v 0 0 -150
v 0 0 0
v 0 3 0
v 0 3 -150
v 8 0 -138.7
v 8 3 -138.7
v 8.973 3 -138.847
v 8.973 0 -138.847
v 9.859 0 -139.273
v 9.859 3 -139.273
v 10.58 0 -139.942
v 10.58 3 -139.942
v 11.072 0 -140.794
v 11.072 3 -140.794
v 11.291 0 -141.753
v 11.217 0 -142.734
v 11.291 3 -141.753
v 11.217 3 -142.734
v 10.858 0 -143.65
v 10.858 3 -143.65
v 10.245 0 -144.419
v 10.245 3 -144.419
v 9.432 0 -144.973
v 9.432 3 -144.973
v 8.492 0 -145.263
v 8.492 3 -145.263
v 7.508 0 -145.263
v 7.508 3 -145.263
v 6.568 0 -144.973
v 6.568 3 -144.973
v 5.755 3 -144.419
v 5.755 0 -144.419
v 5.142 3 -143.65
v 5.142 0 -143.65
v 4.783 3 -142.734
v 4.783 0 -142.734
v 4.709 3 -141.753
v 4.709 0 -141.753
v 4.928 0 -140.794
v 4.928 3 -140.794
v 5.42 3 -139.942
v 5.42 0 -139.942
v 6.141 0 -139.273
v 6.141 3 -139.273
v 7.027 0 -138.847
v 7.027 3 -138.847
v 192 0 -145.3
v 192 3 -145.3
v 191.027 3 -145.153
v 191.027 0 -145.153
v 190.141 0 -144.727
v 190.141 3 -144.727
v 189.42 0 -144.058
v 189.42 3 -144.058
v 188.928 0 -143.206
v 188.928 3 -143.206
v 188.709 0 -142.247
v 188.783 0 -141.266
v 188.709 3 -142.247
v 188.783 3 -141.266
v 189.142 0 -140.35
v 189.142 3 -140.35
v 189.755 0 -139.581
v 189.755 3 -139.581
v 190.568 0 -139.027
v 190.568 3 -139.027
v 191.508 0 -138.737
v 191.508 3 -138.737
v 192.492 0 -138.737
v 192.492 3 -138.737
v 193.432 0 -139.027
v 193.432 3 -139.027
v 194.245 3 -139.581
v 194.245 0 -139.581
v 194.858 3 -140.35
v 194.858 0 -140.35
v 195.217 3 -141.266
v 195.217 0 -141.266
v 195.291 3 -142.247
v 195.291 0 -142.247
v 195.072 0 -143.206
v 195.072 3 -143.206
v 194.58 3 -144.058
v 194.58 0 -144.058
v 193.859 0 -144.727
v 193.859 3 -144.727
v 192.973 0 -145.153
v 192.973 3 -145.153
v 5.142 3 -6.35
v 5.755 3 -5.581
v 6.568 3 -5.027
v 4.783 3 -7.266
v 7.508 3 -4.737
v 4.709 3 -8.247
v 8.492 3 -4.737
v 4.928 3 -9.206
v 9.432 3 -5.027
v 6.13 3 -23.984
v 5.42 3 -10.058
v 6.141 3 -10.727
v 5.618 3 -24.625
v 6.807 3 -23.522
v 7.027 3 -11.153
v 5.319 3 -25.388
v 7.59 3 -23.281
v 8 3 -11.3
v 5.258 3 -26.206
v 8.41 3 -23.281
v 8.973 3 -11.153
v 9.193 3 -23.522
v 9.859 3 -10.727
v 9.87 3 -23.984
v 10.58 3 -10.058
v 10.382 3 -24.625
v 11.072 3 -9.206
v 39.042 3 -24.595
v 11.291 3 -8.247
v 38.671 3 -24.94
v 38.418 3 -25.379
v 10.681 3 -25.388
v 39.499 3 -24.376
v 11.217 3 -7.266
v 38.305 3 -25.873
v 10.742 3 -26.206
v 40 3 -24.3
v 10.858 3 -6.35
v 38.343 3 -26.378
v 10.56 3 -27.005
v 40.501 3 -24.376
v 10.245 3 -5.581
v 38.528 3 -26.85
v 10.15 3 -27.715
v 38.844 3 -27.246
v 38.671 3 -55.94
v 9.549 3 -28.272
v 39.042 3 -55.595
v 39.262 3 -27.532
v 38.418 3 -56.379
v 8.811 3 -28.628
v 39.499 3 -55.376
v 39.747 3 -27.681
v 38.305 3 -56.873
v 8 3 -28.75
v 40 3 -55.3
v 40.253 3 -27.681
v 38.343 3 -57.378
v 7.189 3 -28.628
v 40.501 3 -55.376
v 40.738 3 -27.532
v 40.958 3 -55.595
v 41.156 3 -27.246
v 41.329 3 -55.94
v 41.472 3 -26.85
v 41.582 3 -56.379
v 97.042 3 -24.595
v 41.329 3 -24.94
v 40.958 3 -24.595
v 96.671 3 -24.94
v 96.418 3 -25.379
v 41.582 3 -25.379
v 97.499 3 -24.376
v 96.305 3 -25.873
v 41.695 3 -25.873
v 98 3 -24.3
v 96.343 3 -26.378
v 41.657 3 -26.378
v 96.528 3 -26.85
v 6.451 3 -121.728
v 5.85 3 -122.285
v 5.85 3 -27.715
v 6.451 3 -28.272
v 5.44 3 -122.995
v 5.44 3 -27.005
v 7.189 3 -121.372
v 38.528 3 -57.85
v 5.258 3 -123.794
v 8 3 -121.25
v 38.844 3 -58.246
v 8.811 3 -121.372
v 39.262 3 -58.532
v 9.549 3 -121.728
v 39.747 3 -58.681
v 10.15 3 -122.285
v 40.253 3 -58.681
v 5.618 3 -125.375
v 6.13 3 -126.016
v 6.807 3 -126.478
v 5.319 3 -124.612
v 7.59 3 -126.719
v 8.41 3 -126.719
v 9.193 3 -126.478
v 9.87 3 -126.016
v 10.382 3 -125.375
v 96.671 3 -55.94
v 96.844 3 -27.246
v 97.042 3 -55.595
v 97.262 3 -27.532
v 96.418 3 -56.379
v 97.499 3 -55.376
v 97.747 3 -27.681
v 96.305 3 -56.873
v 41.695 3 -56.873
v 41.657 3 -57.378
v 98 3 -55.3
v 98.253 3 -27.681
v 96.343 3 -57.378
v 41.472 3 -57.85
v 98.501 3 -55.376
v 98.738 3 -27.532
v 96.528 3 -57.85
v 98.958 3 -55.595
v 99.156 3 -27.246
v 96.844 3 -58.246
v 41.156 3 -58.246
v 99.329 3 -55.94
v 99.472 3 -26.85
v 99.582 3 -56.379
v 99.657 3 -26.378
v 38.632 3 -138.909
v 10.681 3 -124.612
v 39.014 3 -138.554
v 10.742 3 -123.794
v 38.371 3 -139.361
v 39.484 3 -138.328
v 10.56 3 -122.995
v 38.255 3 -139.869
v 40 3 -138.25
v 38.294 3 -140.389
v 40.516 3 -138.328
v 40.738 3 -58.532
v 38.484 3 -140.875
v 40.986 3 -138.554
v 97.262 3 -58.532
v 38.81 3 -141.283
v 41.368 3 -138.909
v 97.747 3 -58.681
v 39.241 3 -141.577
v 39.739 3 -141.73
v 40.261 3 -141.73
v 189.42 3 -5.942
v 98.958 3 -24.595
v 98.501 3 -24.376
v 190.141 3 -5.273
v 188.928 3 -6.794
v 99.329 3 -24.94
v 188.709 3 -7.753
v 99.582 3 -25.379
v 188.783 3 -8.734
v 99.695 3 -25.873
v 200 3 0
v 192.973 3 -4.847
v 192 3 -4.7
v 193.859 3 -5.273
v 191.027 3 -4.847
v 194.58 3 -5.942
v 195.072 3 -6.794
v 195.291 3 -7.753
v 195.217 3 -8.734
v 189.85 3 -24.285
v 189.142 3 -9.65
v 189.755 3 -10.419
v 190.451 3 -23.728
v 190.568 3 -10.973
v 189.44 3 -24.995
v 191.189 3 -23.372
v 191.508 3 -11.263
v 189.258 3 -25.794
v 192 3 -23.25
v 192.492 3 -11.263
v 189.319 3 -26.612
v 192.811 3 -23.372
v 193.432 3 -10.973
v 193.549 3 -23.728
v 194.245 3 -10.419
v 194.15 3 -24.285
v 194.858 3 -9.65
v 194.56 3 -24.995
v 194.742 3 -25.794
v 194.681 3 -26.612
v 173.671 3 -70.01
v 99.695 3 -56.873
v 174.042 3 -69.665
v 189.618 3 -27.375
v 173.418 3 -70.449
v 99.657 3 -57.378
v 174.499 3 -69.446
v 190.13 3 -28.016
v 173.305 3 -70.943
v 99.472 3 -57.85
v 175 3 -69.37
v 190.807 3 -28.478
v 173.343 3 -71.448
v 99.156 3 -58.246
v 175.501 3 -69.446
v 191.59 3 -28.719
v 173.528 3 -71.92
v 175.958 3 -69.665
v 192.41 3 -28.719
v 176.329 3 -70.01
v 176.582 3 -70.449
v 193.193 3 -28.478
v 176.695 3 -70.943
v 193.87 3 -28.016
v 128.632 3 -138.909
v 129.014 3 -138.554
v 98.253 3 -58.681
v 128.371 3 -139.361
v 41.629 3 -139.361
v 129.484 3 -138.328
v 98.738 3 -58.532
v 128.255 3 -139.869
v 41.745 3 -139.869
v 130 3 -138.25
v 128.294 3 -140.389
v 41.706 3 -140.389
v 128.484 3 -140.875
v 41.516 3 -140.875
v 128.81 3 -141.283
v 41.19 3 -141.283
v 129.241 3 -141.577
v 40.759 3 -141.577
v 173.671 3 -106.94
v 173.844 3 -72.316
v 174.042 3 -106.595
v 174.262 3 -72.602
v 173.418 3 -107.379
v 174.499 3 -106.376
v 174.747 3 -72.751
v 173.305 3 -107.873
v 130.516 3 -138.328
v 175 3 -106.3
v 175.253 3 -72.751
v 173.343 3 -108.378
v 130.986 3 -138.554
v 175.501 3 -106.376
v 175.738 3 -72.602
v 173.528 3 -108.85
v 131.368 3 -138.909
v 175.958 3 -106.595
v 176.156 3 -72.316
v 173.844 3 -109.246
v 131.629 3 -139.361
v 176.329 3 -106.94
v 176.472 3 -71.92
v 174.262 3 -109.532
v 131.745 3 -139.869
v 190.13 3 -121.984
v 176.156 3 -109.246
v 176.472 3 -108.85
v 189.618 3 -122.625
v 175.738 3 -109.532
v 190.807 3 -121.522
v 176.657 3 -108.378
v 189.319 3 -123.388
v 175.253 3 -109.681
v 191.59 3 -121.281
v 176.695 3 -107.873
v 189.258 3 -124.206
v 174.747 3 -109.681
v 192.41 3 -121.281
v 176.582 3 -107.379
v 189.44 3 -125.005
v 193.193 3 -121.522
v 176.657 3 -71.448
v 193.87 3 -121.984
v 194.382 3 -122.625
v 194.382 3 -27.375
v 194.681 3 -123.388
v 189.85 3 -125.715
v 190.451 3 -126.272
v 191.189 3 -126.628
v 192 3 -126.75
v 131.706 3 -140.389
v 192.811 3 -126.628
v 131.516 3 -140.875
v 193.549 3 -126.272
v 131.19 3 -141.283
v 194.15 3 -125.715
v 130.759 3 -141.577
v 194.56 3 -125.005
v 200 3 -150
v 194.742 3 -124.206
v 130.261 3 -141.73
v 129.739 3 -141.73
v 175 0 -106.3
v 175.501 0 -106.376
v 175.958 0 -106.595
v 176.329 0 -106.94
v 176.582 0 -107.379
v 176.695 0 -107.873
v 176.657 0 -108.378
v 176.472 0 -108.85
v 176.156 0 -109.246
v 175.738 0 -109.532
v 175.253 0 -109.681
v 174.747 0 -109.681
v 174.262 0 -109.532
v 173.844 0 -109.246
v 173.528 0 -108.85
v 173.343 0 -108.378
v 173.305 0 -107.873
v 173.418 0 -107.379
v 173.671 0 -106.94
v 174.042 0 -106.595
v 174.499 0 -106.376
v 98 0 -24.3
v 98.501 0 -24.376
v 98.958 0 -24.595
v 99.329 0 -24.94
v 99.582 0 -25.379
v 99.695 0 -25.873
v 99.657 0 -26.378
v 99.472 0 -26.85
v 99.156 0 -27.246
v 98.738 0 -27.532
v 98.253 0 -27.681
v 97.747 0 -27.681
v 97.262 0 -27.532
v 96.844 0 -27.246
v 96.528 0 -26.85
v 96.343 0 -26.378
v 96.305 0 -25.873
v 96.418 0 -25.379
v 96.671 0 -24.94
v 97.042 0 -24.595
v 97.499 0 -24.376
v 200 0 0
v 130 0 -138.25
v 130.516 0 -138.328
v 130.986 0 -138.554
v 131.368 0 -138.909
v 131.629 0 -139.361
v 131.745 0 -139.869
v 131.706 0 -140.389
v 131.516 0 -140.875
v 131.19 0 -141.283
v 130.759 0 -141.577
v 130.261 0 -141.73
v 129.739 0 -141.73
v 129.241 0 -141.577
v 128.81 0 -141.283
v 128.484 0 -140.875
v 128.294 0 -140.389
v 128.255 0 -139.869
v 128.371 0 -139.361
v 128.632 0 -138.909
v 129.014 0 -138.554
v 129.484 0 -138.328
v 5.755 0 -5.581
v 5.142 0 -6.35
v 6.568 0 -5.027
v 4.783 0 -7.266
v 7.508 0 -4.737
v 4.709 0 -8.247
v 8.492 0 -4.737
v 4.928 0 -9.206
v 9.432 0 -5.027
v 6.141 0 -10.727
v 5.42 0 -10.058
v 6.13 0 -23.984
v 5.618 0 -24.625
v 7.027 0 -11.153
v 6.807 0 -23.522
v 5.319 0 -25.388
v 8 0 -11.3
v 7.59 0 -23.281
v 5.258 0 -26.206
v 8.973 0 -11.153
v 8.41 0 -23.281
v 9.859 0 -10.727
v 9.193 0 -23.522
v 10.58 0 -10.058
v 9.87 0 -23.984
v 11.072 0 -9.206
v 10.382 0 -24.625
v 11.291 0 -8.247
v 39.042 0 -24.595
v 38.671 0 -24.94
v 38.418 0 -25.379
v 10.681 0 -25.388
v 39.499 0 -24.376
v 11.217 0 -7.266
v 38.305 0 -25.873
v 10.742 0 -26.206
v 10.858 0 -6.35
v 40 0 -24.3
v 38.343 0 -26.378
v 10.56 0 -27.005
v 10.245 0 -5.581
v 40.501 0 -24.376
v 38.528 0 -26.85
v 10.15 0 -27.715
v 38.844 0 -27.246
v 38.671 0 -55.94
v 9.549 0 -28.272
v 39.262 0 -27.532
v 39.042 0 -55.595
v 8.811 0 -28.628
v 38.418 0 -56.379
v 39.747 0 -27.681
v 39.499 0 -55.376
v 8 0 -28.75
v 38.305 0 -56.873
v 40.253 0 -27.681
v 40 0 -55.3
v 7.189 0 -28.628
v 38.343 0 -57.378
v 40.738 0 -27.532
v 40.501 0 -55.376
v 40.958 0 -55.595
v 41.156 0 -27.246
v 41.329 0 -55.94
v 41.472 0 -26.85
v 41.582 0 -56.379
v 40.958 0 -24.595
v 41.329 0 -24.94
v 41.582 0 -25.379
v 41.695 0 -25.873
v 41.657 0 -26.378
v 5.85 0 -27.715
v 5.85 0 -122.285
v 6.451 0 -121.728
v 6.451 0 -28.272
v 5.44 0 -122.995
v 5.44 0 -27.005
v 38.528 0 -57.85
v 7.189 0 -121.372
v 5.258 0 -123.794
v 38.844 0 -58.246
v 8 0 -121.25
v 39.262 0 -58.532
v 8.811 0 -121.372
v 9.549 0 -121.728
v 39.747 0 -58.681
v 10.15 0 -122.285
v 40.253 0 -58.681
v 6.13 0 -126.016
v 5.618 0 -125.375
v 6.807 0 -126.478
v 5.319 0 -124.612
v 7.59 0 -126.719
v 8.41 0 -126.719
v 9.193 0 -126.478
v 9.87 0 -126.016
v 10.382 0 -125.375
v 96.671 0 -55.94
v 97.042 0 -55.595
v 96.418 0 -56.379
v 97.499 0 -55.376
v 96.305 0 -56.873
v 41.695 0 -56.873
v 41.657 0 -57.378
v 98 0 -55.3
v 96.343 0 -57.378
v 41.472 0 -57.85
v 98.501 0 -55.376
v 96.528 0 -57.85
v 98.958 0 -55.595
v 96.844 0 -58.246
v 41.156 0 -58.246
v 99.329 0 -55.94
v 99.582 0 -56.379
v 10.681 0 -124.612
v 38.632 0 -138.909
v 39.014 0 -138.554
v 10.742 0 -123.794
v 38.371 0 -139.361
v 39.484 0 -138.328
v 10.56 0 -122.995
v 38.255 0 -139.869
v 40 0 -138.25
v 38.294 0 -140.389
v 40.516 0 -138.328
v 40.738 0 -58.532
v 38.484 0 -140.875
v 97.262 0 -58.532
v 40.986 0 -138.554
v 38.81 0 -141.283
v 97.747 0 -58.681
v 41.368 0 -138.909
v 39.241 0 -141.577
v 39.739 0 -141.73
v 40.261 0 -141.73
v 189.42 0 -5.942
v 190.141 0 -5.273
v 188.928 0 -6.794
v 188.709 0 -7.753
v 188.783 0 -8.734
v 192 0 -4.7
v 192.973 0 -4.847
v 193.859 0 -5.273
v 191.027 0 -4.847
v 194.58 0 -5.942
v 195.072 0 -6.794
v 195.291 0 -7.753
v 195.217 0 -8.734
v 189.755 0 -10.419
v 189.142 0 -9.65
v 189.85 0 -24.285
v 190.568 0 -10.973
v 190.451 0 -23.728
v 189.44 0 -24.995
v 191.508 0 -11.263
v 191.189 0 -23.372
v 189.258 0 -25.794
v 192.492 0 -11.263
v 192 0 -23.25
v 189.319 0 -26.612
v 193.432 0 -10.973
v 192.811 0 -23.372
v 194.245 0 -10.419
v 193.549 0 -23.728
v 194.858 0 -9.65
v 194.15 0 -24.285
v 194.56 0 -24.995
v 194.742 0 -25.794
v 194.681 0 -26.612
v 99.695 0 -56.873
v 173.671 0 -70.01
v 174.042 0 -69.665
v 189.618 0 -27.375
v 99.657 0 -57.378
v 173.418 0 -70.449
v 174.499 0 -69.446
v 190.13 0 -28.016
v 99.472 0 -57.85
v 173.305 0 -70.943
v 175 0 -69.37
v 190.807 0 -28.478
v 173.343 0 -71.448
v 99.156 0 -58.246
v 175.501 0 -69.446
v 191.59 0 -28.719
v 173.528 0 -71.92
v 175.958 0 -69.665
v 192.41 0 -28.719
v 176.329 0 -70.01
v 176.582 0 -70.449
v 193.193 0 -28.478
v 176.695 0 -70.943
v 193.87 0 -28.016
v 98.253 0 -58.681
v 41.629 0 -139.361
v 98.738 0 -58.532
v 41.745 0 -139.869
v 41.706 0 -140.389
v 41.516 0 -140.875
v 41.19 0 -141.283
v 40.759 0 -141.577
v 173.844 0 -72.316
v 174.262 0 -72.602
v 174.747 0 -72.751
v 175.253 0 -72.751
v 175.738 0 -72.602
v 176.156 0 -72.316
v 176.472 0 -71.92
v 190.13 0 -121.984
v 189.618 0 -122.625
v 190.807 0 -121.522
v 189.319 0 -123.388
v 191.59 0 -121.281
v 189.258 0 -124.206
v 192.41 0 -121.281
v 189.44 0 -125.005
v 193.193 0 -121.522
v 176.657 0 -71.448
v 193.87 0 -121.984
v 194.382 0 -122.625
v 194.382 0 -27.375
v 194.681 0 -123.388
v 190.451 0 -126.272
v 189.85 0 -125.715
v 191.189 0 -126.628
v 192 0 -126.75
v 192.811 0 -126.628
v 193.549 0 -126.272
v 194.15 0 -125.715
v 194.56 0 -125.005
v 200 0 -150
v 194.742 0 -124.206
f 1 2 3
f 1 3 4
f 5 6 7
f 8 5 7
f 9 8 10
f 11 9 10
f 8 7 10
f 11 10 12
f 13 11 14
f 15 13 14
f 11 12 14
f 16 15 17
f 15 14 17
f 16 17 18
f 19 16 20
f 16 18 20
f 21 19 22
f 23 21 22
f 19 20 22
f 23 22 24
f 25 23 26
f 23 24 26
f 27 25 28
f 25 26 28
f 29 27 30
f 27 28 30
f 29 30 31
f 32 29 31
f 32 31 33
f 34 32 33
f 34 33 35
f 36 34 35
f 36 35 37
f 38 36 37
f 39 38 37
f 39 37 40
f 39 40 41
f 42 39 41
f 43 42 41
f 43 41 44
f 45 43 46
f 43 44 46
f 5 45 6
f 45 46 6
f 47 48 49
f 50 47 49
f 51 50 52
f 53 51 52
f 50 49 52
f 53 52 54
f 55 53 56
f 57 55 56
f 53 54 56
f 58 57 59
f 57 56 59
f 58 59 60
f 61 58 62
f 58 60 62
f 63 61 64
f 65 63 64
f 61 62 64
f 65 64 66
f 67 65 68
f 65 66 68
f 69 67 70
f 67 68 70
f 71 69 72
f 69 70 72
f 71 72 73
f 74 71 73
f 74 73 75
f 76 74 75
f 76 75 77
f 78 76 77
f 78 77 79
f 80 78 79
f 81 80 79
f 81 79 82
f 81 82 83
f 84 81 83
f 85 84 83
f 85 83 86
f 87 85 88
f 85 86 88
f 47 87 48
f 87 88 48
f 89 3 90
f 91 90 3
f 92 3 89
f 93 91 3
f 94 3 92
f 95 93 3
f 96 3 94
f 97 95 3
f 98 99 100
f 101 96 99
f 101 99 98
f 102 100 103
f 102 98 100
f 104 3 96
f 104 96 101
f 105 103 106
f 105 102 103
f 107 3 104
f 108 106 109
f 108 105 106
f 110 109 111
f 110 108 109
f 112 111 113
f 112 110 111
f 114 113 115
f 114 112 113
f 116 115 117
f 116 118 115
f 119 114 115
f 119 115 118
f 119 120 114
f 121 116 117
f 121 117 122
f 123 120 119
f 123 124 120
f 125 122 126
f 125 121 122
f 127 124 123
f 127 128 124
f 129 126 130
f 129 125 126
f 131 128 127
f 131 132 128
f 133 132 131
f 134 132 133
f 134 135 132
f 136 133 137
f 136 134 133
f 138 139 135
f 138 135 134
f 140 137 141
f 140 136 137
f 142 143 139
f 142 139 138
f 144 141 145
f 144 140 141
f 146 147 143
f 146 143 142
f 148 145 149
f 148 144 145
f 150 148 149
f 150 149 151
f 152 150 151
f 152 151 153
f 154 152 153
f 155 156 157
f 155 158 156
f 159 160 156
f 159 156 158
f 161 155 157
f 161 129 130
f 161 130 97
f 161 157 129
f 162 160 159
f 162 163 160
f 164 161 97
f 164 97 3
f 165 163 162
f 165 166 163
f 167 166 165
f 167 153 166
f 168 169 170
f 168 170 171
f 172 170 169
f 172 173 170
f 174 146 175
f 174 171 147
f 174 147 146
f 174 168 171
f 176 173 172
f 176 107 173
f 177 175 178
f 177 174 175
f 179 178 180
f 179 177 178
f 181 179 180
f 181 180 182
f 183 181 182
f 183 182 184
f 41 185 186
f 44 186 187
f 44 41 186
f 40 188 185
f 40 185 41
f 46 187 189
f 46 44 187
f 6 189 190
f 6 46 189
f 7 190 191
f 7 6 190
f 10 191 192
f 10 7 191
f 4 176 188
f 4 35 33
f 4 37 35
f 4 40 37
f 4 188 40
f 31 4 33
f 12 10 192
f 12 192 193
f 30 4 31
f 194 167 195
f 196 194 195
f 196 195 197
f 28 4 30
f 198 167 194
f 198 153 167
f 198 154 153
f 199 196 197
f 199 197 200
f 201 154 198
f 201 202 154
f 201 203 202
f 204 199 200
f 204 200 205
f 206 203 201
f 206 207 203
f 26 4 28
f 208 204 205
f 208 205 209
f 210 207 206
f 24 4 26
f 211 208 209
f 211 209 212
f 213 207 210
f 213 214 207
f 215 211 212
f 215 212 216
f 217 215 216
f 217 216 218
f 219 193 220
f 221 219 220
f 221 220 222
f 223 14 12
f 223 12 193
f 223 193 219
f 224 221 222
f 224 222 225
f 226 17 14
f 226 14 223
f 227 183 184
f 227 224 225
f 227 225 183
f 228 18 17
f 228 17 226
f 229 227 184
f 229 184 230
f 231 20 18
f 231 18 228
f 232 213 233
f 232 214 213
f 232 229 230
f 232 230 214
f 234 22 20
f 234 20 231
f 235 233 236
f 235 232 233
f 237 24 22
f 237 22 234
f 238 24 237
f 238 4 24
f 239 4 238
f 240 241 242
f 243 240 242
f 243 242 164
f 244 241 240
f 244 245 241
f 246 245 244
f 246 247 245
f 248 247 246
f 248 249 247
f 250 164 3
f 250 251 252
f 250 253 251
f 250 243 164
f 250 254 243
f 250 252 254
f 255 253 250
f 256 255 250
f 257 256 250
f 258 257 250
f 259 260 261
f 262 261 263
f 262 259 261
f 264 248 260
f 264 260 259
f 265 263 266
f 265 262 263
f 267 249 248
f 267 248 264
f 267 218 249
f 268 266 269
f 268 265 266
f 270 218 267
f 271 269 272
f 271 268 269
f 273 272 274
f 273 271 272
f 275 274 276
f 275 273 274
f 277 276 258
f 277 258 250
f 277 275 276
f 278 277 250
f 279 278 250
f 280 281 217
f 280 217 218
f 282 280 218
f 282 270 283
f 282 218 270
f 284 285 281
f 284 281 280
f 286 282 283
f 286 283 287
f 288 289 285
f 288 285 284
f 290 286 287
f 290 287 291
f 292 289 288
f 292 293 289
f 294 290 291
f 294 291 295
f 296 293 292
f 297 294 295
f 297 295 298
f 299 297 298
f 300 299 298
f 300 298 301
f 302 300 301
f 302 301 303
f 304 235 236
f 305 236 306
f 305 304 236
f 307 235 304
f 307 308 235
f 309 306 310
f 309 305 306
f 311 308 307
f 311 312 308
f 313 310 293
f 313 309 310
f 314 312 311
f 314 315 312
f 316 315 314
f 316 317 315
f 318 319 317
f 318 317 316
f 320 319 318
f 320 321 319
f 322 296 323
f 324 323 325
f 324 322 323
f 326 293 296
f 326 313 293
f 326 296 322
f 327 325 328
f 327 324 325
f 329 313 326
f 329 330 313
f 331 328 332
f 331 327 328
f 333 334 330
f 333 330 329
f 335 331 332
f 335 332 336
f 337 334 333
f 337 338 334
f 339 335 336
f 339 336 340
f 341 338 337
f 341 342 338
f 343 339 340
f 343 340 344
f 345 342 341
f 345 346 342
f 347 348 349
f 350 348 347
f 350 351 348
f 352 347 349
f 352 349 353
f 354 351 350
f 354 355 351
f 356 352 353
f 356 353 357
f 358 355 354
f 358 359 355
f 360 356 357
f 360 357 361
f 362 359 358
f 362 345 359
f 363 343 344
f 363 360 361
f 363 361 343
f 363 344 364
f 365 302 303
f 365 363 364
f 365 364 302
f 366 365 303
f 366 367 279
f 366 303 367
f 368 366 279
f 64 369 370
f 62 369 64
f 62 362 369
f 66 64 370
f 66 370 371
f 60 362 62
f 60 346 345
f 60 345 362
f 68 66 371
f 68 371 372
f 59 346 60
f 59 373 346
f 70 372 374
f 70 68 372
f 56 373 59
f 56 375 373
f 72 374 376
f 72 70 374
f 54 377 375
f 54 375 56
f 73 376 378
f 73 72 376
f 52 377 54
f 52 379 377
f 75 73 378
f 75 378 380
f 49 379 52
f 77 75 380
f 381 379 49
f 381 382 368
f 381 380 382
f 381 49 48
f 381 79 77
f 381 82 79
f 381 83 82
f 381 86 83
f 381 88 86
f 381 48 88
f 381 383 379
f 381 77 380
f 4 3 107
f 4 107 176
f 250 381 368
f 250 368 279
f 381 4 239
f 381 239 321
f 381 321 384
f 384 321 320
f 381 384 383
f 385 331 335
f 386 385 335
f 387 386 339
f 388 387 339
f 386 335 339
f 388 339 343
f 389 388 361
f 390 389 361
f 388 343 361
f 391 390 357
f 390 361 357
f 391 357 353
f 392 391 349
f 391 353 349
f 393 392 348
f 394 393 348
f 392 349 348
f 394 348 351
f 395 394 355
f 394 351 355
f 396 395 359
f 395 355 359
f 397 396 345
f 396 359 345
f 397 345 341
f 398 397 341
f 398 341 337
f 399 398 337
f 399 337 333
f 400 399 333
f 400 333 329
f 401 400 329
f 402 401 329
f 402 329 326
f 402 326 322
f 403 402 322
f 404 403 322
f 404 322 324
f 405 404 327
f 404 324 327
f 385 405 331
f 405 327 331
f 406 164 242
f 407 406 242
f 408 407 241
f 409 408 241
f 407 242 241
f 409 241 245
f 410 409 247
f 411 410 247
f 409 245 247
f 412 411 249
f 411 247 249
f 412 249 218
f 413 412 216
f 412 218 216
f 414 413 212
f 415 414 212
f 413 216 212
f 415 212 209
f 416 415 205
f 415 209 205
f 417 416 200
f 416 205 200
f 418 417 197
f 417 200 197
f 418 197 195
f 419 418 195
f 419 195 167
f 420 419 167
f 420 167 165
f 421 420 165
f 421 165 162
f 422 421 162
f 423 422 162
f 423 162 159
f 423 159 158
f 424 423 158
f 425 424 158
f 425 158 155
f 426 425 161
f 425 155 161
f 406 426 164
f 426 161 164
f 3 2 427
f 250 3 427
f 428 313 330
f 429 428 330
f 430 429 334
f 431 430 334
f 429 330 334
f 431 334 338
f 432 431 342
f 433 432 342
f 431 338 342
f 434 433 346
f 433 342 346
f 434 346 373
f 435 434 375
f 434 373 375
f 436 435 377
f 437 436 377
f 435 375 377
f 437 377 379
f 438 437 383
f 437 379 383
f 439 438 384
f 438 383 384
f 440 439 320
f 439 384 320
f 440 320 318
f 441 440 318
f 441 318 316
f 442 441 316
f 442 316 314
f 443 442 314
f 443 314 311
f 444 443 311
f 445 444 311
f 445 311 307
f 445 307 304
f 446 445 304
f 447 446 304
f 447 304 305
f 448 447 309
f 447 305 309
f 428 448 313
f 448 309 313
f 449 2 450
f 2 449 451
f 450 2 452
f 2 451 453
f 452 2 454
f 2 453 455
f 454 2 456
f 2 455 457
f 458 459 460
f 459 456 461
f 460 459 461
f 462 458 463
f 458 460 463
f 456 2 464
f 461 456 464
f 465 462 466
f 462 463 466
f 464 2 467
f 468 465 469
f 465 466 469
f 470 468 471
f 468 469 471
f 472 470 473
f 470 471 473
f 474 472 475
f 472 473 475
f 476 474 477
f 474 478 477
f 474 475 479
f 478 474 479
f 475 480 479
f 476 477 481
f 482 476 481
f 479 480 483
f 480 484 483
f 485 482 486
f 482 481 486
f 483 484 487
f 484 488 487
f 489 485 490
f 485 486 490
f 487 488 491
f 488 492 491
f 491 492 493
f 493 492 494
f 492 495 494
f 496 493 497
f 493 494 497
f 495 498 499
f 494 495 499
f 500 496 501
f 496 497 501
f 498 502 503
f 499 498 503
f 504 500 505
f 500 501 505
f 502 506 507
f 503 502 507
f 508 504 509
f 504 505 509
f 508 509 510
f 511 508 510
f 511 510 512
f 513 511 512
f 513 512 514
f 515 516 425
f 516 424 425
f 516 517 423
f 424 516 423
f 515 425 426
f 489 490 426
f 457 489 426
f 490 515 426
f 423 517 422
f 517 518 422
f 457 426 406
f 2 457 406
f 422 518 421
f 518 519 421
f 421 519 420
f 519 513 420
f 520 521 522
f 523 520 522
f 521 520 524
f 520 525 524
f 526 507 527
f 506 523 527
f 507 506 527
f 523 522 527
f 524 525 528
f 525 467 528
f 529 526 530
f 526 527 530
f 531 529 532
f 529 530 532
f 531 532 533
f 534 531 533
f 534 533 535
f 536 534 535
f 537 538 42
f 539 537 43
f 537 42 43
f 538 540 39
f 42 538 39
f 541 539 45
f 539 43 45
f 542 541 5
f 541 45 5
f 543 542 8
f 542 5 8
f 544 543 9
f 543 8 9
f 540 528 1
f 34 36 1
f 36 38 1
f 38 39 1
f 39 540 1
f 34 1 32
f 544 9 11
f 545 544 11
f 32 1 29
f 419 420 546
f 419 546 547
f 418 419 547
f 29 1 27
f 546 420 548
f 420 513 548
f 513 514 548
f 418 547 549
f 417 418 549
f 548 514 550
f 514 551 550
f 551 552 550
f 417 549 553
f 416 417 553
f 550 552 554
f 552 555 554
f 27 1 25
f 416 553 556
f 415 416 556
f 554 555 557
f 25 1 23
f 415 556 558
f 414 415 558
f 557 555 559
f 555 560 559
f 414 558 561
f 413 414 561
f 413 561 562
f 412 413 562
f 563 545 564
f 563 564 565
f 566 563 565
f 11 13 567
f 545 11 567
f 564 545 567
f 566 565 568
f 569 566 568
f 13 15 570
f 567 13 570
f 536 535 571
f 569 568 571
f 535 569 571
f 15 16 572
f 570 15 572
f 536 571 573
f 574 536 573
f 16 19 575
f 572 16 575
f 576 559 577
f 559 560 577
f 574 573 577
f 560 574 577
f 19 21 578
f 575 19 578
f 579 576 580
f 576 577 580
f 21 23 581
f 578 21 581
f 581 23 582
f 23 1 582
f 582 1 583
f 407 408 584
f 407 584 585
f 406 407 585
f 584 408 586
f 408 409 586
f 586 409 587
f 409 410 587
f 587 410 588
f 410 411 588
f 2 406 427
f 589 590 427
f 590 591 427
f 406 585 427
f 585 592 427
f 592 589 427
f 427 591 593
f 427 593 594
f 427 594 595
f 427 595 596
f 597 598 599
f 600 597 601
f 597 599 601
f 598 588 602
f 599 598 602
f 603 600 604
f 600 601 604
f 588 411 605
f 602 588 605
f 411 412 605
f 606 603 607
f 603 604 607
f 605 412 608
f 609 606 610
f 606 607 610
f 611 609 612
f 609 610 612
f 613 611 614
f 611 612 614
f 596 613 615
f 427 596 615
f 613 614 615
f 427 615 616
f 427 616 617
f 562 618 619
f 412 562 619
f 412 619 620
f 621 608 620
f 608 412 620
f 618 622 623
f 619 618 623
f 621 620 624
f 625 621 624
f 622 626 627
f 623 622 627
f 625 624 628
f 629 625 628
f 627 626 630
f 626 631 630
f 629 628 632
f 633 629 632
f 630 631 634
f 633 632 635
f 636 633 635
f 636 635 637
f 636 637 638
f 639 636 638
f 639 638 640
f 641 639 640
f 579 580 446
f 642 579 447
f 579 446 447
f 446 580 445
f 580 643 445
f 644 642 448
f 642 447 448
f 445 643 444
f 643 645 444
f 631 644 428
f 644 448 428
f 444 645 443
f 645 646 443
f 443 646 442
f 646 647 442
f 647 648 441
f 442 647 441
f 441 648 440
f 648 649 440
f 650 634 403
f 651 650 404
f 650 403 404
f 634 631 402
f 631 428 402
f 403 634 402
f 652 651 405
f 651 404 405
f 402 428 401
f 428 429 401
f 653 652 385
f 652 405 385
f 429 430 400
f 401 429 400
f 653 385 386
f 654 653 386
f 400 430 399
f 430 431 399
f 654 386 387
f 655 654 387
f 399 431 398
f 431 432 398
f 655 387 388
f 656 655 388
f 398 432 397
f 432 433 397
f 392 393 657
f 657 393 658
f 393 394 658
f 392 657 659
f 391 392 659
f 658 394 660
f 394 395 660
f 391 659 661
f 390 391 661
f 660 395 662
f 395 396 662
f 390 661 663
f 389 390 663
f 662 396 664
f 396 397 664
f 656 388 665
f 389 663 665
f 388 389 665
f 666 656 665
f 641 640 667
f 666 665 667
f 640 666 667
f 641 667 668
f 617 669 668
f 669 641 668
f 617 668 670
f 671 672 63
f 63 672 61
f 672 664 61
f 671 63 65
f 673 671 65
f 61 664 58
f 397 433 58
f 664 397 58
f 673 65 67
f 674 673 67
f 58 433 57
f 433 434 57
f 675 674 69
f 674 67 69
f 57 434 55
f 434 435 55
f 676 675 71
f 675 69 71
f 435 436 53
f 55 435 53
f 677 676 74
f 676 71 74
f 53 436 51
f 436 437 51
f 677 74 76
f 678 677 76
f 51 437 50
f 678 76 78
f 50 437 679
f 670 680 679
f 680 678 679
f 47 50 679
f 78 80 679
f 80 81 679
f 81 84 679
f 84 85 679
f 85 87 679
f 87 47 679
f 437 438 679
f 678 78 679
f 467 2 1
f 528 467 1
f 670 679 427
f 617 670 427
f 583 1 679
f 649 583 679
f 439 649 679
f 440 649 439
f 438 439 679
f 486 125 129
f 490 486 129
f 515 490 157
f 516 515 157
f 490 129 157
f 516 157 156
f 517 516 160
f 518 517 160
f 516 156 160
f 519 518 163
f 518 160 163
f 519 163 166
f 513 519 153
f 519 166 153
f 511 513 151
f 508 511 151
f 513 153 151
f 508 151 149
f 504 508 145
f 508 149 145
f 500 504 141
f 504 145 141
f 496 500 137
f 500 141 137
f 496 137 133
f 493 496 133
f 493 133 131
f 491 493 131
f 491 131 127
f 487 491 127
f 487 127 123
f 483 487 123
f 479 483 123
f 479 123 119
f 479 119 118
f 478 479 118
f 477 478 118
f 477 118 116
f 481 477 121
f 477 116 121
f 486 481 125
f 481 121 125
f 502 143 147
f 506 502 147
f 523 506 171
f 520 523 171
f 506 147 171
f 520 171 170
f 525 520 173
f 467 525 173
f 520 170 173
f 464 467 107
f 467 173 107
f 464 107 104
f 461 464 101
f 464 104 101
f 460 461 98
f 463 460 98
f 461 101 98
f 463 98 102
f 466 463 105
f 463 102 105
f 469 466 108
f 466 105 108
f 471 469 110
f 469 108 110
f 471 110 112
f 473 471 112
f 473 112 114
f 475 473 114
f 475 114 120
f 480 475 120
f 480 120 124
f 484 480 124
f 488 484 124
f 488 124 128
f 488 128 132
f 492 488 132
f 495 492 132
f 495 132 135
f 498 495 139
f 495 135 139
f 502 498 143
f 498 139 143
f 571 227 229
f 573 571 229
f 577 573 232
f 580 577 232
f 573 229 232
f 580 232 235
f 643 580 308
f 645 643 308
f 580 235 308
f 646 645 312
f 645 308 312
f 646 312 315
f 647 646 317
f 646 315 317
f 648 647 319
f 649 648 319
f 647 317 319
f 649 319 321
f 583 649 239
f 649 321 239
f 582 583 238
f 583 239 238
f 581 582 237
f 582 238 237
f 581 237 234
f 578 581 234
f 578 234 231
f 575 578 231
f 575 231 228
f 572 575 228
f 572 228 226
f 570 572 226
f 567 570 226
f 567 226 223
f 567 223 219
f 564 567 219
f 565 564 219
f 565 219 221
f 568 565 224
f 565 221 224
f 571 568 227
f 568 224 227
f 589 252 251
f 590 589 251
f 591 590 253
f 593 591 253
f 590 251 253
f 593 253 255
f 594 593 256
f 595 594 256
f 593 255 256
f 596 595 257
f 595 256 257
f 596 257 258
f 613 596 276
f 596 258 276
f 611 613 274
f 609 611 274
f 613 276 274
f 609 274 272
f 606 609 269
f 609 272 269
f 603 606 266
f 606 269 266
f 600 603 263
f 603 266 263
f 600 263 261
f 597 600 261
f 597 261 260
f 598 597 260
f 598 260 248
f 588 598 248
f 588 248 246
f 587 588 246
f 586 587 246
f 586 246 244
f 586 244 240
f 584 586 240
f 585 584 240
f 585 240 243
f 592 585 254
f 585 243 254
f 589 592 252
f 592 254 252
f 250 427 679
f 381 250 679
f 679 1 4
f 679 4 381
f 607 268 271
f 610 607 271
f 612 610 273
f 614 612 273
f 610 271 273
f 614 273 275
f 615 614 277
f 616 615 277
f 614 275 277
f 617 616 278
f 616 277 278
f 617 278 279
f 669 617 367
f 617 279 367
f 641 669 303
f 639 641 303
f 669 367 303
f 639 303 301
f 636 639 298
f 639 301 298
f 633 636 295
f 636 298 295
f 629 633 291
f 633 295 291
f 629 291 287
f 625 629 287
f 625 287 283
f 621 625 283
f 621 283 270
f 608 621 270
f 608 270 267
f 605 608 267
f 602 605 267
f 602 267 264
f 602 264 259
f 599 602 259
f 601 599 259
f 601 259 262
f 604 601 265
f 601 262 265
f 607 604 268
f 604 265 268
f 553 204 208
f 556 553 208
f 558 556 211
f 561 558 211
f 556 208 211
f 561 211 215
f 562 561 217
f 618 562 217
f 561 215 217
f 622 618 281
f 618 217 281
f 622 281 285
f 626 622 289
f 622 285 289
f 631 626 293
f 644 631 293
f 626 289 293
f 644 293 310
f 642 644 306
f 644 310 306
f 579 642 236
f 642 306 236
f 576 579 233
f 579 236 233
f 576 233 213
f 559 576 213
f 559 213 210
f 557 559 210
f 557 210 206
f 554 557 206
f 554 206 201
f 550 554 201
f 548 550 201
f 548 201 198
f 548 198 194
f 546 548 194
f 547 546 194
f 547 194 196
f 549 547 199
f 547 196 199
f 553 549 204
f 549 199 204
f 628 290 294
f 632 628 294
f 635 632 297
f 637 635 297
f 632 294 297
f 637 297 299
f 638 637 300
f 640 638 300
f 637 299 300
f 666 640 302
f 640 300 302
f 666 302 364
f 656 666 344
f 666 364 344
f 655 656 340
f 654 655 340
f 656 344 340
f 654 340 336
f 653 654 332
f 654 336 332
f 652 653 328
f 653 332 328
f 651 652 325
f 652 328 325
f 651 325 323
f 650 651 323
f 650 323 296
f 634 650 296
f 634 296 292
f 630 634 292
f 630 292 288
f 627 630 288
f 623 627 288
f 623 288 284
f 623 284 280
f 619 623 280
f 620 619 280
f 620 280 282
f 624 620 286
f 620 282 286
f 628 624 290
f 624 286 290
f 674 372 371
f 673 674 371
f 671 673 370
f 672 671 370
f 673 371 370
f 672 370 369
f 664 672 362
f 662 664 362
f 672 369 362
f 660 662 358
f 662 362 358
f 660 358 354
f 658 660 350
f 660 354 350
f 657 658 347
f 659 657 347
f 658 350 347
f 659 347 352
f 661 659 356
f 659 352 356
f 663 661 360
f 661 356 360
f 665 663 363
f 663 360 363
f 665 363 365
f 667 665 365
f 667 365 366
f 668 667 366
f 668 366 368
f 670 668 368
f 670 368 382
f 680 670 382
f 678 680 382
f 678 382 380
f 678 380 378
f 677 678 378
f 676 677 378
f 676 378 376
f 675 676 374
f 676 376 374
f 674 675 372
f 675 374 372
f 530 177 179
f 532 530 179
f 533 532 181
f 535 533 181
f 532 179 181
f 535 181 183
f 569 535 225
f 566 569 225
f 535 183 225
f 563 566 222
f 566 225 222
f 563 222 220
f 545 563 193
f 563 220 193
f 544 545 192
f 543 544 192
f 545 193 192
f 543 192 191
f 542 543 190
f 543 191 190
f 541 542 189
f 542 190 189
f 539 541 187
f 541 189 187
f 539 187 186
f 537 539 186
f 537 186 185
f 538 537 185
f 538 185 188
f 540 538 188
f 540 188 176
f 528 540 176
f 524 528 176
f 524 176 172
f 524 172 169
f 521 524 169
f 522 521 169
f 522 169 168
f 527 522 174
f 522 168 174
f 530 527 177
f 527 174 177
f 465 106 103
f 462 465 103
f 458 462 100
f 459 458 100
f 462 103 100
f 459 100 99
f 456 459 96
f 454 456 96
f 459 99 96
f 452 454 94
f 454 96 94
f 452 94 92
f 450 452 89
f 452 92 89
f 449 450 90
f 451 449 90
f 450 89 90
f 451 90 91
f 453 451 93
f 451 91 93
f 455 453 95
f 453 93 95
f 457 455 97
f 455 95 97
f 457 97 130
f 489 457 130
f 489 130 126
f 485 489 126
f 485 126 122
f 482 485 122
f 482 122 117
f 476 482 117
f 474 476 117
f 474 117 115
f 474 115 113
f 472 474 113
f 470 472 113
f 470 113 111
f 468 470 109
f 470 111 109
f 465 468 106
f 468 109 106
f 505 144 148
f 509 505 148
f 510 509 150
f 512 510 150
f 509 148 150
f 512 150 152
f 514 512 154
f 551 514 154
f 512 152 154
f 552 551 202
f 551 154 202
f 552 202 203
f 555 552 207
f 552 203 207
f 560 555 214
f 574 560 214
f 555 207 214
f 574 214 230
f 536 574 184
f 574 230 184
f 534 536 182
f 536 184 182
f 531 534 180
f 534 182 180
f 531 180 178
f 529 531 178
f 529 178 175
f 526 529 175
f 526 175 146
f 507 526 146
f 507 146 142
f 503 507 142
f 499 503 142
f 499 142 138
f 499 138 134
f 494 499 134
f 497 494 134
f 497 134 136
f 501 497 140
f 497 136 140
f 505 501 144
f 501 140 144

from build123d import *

# Parameters (mm, degrees)
SKETCH1_W           = 200
SKETCH1_H           = 150
BOSS_EXTRUDE1_DEPTH = 3
SKETCH2_R           = 3.3
SKETCH2_R_2         = 1.7
SKETCH2_R_3         = 2.75
SKETCH2_R_4         = 1.75
CUT_EXTRUDE1_DEPTH  = 3


with BuildPart() as part:
    # Sketch1 → Boss-Extrude1 (new body)
    with BuildSketch(Plane(origin=(0, 0, 0), x_dir=(1, 0, 0), z_dir=(0, 1, 0))):
        with Locations((100, 75)):
            Rectangle(SKETCH1_W, SKETCH1_H)
    extrude(amount=BOSS_EXTRUDE1_DEPTH)

    # Sketch2 → Cut-Extrude1 (cut)
    with BuildSketch(Plane(origin=(0, 3, 0), x_dir=(1, 0, 0), z_dir=(0, 1, 0))):
        with Locations(Location((8, 142, 0), (0, 0, 270))):
            Circle(SKETCH2_R)
        with Locations(Location((8, 8, 0), (0, 0, 90))):
            Circle(SKETCH2_R)
        with Locations(Location((192, 8, 0), (0, 0, 270))):
            Circle(SKETCH2_R)
        with Locations(Location((192, 142, 0), (0, 0, 90))):
            Circle(SKETCH2_R)
        with Locations(Location((40, 57, 0), (0, 0, 270))):
            Circle(SKETCH2_R_2)
        with Locations(Location((98, 57, 0), (0, 0, 270))):
            Circle(SKETCH2_R_2)
        with Locations(Location((98, 26, 0), (0, 0, 270))):
            Circle(SKETCH2_R_2)
        with Locations(Location((40, 26, 0), (0, 0, 270))):
            Circle(SKETCH2_R_2)
        with Locations(Location((8, 124, 0), (0, 0, 270))):
            Circle(SKETCH2_R_3)
        with Locations(Location((8, 26, 0), (0, 0, 90))):
            Circle(SKETCH2_R_3)
        with Locations(Location((192, 26, 0), (0, 0, 270))):
            Circle(SKETCH2_R_3)
        with Locations(Location((192, 124, 0), (0, 0, 90))):
            Circle(SKETCH2_R_3)
        with Locations(Location((175, 108, 0), (0, 0, 270))):
            Circle(SKETCH2_R_2)
        with Locations(Location((175, 71.07, 0), (0, 0, 270))):
            Circle(SKETCH2_R_2)
        with Locations(Location((40, 140, 0), (0, 0, 270))):
            Circle(SKETCH2_R_4)
        with Locations(Location((130, 140, 0), (0, 0, 270))):
            Circle(SKETCH2_R_4)
    extrude(amount=-CUT_EXTRUDE1_DEPTH, mode=Mode.SUBTRACT)


solid = part.part
